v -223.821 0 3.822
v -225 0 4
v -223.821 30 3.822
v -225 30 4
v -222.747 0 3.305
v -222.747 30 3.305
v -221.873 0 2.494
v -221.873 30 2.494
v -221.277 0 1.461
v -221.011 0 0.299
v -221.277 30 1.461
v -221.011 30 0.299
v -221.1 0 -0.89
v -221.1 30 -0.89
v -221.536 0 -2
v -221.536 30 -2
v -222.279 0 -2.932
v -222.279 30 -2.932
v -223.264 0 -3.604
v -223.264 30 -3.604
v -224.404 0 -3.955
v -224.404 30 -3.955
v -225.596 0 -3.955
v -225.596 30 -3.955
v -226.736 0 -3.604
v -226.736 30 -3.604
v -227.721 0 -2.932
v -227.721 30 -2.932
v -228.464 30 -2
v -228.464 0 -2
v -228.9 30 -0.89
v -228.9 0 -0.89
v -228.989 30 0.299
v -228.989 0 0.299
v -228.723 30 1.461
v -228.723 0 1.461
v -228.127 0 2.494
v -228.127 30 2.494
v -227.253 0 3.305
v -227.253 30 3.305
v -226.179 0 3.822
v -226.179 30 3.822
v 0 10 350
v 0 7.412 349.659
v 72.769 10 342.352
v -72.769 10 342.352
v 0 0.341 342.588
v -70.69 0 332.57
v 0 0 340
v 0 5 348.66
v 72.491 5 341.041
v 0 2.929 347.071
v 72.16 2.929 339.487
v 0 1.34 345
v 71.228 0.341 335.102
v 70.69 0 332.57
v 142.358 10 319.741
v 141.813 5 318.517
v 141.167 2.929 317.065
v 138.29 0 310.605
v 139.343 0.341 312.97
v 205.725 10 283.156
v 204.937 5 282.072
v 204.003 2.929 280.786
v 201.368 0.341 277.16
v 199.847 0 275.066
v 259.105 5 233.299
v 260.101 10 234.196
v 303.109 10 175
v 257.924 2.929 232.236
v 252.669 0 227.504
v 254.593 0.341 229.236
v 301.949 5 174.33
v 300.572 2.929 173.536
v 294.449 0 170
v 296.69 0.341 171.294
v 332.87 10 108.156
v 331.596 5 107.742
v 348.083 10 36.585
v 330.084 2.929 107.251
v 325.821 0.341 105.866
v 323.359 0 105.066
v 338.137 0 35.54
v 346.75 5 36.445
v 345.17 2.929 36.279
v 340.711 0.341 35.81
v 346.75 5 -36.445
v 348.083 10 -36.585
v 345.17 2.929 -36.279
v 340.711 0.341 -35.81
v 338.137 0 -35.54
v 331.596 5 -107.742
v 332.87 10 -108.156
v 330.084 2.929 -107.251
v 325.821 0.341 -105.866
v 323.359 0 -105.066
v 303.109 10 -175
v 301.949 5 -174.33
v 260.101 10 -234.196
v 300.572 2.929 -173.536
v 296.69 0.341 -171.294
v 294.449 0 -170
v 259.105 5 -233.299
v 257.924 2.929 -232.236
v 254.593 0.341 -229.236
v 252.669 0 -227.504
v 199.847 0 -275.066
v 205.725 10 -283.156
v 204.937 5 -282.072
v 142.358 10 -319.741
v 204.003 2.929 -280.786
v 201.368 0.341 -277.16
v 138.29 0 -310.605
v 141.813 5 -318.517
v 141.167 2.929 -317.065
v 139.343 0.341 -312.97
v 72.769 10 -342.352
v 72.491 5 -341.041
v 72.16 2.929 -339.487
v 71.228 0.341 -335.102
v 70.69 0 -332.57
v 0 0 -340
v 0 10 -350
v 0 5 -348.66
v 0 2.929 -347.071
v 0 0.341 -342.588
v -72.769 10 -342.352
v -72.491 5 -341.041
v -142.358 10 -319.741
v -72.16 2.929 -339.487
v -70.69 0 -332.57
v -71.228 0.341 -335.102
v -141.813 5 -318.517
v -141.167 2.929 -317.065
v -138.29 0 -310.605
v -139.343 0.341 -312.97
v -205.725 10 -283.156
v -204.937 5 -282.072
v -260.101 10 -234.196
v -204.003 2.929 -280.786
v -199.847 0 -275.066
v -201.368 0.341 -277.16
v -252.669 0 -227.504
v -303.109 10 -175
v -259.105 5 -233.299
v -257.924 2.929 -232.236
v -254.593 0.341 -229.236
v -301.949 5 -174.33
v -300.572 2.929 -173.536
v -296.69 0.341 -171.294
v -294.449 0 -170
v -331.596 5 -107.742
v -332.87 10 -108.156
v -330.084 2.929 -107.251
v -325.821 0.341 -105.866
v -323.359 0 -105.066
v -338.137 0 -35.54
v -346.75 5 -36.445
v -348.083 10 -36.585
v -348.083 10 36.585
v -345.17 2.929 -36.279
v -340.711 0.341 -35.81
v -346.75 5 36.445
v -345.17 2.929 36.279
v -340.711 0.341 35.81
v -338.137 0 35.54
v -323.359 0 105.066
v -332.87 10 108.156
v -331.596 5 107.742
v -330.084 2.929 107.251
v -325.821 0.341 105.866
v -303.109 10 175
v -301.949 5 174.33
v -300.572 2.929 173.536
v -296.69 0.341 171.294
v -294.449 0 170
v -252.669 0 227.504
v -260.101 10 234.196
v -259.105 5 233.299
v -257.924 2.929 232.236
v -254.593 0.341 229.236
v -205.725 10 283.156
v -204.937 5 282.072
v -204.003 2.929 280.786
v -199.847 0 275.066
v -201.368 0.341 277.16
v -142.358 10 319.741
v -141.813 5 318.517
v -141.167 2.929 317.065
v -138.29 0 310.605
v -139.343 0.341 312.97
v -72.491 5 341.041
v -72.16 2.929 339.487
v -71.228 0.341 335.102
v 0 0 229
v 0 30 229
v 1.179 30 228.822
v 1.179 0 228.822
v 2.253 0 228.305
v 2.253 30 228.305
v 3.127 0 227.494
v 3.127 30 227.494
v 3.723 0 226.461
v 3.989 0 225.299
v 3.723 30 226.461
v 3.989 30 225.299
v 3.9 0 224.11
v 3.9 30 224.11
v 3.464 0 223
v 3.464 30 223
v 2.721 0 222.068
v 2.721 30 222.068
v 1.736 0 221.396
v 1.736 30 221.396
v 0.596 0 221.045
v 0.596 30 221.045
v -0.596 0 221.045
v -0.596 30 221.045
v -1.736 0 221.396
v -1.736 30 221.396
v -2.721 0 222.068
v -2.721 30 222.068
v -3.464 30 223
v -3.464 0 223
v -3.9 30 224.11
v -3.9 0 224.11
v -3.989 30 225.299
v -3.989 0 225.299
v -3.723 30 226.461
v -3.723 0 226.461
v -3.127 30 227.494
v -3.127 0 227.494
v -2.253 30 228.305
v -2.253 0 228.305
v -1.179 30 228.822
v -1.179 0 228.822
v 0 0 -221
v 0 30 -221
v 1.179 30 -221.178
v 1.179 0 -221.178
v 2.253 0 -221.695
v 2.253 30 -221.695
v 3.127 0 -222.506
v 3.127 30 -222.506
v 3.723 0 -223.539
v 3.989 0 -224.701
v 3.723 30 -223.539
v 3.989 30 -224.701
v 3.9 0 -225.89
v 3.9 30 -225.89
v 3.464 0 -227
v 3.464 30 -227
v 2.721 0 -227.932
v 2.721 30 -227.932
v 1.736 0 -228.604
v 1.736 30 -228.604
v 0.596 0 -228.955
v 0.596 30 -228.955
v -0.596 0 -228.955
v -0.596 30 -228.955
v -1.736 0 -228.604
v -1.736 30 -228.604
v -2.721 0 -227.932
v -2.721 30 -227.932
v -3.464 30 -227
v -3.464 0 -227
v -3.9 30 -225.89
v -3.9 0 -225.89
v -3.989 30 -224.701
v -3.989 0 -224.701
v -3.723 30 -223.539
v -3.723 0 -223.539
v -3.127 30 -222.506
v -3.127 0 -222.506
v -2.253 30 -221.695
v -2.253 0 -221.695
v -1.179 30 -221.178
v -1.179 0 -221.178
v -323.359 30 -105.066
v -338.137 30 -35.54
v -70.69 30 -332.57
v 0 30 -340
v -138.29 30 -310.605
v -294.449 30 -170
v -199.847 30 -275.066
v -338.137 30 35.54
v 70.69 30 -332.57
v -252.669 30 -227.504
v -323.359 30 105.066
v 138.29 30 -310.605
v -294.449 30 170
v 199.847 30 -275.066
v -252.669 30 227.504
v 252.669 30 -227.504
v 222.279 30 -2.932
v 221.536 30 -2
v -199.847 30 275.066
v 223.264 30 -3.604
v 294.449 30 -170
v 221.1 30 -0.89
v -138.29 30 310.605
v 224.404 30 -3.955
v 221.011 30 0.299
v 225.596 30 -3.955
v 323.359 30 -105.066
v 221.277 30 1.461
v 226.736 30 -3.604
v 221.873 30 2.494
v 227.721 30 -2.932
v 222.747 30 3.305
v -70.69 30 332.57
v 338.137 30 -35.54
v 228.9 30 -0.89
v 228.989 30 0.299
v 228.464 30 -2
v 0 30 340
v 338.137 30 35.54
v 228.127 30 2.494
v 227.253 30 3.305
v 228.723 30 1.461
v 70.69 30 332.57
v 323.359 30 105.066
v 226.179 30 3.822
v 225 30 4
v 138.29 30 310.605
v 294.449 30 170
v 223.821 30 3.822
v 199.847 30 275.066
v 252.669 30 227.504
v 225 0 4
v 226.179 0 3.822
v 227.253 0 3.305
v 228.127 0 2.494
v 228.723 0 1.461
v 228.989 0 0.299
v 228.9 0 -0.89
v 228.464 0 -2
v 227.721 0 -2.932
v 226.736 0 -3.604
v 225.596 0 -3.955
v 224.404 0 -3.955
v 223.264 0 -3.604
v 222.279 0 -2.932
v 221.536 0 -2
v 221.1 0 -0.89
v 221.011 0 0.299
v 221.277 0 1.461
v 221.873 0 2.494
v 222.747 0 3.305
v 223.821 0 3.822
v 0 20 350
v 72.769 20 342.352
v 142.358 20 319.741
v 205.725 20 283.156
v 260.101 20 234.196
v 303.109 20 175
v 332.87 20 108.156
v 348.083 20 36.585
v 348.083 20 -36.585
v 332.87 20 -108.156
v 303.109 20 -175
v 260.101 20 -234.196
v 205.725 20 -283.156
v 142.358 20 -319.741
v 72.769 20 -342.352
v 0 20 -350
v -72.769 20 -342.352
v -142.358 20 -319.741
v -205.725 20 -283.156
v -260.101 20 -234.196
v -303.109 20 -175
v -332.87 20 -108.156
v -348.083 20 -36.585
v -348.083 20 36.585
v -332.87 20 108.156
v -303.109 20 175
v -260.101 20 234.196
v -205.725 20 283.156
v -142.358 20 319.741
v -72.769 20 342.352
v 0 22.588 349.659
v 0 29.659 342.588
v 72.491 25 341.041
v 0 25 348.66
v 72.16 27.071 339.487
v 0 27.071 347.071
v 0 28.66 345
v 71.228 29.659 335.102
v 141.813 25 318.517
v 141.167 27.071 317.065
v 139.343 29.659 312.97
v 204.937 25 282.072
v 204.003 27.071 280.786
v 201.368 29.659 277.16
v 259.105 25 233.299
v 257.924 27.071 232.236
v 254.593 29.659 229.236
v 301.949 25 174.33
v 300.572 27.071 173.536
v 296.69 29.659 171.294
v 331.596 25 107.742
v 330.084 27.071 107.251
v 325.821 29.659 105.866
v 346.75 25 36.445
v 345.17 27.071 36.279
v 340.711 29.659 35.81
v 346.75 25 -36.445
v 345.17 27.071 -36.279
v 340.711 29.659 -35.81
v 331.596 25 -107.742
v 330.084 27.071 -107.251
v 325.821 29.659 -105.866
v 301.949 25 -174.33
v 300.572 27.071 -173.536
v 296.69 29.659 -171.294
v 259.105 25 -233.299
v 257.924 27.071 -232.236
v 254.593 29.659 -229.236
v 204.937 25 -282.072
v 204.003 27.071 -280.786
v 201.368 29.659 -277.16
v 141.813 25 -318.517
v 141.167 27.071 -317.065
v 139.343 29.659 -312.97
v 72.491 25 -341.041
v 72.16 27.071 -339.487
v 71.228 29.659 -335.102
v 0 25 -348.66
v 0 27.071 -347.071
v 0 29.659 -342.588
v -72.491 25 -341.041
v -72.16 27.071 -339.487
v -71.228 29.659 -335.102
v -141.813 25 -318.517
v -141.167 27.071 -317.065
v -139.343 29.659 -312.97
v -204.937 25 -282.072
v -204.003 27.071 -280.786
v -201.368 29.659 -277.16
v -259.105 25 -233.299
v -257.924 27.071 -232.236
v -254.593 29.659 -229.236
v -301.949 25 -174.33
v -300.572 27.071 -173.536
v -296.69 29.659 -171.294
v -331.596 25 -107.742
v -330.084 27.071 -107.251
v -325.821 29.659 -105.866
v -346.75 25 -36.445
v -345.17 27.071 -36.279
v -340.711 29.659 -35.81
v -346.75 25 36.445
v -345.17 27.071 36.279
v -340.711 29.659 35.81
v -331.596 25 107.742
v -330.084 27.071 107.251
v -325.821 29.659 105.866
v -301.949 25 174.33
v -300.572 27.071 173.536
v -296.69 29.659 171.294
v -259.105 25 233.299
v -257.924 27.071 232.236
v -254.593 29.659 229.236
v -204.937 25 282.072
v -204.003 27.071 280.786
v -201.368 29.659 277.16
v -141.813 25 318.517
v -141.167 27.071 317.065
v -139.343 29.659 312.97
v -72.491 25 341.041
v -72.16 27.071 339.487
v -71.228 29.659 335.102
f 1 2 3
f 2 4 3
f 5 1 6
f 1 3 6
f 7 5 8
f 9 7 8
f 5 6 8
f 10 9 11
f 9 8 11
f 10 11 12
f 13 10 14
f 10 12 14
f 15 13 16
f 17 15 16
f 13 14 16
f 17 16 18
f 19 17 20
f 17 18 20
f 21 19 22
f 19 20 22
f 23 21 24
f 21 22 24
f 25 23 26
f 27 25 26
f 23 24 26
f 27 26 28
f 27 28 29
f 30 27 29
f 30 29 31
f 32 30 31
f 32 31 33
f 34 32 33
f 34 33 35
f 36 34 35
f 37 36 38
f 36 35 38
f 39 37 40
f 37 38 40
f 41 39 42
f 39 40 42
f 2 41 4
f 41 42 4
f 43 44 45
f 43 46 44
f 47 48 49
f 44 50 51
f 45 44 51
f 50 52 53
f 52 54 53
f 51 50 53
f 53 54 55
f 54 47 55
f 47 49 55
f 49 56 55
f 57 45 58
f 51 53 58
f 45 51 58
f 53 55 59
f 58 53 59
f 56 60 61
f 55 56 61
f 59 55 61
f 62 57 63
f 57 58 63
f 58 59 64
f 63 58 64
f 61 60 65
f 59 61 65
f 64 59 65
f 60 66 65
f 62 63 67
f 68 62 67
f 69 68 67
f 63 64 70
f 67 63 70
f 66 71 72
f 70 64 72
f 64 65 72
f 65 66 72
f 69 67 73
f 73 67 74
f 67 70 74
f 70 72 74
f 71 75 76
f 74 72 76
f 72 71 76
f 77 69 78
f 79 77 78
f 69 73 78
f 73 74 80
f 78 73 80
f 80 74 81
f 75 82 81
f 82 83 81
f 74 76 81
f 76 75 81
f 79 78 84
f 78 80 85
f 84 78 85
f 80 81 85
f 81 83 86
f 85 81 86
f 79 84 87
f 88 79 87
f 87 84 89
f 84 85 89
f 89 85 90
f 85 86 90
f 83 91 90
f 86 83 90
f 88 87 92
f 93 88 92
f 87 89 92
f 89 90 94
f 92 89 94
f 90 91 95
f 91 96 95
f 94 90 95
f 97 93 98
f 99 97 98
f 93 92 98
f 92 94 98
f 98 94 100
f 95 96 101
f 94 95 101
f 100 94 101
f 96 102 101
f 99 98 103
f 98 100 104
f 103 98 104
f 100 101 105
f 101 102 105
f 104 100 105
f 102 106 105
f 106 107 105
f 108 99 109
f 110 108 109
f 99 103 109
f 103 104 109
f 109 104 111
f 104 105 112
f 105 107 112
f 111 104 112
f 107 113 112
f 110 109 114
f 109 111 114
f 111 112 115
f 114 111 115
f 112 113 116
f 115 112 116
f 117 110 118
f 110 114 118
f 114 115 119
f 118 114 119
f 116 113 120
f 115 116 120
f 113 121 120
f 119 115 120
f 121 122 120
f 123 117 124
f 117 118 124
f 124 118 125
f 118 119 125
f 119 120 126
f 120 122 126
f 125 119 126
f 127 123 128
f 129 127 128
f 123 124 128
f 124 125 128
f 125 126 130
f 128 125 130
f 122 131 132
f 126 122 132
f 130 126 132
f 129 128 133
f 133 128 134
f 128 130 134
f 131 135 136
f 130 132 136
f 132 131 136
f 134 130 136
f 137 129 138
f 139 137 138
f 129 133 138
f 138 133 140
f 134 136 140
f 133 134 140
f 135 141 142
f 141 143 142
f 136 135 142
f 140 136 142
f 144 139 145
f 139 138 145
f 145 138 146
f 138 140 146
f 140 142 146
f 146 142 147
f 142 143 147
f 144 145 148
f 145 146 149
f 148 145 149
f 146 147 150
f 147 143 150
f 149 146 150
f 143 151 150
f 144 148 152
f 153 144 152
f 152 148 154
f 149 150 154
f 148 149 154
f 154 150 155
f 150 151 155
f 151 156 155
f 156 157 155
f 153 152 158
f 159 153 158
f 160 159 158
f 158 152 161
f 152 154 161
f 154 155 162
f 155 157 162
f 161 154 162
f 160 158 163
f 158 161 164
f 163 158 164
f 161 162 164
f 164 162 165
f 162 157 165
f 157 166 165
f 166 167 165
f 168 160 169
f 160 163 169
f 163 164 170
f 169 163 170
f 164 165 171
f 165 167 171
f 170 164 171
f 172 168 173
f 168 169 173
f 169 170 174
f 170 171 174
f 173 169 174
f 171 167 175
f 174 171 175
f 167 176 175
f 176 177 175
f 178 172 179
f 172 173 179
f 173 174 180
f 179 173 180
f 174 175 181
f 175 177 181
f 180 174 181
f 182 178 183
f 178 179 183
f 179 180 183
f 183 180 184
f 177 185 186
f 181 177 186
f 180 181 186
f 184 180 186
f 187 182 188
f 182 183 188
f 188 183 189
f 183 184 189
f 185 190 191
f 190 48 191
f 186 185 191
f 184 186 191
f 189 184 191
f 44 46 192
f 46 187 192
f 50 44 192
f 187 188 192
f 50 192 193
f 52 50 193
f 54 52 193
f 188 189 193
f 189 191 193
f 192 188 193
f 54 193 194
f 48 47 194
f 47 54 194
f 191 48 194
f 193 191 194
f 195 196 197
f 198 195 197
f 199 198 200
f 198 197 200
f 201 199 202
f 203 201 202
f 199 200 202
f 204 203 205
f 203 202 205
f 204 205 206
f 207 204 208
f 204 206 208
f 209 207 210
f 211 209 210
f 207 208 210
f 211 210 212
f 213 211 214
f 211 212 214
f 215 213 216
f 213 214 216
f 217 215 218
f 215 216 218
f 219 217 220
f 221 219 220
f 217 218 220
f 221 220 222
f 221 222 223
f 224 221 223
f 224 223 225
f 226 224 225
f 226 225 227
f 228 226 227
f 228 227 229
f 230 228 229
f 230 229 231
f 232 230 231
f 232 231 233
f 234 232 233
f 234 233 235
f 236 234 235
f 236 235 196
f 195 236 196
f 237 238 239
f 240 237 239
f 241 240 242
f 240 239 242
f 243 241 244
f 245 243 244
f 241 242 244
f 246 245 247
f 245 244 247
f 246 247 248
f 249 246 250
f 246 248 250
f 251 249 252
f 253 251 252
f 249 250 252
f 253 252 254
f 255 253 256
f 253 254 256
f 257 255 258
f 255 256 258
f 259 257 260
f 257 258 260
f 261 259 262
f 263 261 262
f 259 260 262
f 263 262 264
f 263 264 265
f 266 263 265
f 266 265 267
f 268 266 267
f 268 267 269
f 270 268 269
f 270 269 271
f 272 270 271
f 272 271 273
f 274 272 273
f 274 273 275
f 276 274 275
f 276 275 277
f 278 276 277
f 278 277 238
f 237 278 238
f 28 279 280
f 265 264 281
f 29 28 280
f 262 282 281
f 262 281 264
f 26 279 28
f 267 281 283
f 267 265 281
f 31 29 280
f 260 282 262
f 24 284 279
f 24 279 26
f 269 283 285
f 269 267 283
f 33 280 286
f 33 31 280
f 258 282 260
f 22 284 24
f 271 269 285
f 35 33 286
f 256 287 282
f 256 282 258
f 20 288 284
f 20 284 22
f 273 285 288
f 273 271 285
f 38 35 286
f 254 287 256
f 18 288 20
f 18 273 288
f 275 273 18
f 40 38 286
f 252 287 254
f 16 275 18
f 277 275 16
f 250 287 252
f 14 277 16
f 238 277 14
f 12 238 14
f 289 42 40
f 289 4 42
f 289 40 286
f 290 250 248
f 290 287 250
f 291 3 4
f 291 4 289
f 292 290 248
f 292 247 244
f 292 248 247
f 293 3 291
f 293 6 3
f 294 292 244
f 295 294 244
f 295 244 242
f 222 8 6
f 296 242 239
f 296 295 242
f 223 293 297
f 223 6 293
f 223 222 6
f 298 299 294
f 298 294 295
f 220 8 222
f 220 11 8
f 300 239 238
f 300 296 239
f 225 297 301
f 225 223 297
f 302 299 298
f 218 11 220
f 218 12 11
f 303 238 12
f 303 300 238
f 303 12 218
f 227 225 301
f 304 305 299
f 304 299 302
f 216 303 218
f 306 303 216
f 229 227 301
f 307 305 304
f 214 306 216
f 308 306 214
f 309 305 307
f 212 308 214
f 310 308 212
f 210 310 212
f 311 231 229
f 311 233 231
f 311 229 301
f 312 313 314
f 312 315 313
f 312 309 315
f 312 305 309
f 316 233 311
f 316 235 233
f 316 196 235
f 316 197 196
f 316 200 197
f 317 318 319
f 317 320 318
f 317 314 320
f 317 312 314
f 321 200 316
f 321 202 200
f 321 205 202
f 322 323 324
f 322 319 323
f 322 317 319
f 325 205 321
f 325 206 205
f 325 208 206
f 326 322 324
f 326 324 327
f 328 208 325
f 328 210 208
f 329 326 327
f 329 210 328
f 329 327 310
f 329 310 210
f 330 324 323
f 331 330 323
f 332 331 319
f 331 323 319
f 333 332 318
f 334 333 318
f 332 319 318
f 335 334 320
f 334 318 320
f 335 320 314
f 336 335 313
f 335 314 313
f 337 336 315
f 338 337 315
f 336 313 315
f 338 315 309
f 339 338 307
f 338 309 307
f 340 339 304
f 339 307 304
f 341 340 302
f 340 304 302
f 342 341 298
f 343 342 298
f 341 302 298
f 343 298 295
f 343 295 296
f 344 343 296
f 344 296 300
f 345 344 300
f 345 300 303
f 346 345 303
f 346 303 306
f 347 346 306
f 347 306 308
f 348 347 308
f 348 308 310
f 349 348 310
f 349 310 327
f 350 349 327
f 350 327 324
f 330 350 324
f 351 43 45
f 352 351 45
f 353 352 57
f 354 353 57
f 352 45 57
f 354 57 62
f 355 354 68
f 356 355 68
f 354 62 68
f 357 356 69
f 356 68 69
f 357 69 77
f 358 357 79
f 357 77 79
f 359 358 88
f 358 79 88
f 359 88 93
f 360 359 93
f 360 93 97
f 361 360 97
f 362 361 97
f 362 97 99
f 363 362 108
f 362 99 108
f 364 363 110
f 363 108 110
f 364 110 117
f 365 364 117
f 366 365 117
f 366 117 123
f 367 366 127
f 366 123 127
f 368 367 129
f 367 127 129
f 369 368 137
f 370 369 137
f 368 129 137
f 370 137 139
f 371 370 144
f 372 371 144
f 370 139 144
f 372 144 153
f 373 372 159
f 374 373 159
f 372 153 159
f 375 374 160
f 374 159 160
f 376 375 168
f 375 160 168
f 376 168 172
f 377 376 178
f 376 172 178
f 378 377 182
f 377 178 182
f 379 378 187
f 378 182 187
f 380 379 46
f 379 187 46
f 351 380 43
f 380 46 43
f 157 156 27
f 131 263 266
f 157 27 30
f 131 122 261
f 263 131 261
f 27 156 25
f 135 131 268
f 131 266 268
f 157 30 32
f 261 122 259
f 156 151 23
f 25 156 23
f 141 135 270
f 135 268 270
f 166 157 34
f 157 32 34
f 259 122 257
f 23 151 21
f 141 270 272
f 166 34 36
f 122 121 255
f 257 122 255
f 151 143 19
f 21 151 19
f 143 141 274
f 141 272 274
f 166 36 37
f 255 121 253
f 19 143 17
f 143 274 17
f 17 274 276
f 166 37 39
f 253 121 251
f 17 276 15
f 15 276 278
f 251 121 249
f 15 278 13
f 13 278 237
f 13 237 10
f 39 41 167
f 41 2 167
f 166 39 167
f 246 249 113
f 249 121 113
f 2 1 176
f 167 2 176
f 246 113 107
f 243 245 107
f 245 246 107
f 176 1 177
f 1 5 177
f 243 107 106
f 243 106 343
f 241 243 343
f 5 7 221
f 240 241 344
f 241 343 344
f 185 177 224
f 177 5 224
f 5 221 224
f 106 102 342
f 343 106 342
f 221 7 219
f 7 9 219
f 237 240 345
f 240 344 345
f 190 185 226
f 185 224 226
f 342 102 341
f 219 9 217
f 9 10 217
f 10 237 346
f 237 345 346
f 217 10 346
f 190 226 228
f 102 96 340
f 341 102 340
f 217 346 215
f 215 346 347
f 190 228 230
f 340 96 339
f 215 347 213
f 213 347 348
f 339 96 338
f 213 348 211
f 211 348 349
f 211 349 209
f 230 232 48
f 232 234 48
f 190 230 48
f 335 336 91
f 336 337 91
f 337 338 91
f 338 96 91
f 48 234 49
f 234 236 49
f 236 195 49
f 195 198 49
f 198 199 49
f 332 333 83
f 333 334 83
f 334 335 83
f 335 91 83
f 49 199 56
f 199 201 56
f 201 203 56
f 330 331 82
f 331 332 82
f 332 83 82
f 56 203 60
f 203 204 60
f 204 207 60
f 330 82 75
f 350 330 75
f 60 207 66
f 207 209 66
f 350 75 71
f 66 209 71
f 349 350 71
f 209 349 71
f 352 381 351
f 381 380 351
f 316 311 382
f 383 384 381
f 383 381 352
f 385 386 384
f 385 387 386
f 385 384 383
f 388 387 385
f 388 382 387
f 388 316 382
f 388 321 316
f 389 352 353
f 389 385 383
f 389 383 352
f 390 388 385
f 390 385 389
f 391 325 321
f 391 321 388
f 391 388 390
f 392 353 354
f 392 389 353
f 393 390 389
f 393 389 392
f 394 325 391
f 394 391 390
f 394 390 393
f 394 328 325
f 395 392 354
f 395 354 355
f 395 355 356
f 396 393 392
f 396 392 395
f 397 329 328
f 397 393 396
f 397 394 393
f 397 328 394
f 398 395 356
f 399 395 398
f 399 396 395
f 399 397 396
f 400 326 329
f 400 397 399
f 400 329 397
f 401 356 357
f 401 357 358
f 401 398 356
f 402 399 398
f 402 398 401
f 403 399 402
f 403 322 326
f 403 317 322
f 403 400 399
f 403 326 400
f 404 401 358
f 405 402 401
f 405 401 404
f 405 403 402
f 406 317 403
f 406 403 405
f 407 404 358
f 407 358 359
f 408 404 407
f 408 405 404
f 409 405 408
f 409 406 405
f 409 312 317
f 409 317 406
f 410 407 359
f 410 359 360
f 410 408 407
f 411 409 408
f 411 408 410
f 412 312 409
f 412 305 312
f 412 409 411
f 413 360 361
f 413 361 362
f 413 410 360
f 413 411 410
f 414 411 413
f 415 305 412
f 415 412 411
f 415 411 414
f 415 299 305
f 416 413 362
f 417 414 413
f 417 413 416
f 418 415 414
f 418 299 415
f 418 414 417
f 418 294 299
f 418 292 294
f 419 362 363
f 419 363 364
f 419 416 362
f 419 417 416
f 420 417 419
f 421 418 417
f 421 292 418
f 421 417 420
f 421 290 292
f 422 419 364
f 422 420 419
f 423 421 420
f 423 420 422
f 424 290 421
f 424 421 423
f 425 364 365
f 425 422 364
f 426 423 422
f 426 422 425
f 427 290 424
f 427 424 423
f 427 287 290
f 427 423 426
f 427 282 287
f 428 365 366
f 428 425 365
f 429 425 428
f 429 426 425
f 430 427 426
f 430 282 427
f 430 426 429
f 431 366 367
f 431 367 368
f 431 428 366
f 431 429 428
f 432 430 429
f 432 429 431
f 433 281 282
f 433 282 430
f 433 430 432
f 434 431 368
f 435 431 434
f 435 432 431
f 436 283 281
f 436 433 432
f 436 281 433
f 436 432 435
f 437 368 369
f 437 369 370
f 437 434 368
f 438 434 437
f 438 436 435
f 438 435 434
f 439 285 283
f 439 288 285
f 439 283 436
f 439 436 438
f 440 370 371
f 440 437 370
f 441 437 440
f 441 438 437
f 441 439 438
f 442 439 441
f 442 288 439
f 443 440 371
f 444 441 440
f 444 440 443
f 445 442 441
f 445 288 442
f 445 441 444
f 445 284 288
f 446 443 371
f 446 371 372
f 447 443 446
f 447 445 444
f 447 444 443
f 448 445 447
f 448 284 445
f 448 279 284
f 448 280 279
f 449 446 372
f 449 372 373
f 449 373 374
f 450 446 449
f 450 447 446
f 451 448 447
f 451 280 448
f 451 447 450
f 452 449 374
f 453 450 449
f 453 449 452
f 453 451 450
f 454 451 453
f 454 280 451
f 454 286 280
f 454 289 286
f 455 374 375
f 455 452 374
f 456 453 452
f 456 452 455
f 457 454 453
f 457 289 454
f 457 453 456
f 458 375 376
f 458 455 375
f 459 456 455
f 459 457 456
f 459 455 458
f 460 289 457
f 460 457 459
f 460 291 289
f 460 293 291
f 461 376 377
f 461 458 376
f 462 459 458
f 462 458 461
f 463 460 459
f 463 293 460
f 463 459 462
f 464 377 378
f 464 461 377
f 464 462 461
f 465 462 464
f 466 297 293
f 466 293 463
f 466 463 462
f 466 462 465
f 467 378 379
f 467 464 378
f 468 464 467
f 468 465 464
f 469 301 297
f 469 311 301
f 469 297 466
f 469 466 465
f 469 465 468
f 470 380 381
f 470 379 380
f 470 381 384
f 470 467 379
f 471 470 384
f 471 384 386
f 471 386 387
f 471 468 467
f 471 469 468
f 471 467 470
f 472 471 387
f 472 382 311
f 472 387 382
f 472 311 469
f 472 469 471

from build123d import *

# Parameters (mm, degrees)
SKETCH1_R           = 350
BOSS_EXTRUDE1_DEPTH = 30
FILLET1_R           = 10
SKETCH2_R           = 4
CUT_EXTRUDE1_DEPTH  = 48


with BuildPart() as part:
    # Sketch1 → Boss-Extrude1 (new body)
    with BuildSketch(Plane(origin=(0, 0, 0), x_dir=(1, 0, 0), z_dir=(0, 1, 0))):
        with Locations(Location((0, 0, 0), (0, 0, 270))):
            Circle(SKETCH1_R)
    extrude(amount=BOSS_EXTRUDE1_DEPTH)

    # Fillet1
    fillet1_edges = [part.edges().sort_by_distance(p)[0] for p in [
        (0, 0, -350),
        (0, 30, -350),
    ]]
    fillet(fillet1_edges, radius=FILLET1_R)

    # Sketch2 → Cut-Extrude1 (cut, symmetric)
    with BuildSketch(Plane(origin=(0, 30, 0), x_dir=(1, 0, 0), z_dir=(0, 1, 0))):
        with Locations(Location((0, 225, 0), (0, 0, 270))):
            Circle(SKETCH2_R)
        with Locations(Location((225, 0, 0), (0, 0, 270))):
            Circle(SKETCH2_R)
        with Locations(Location((0, -225, 0), (0, 0, 270))):
            Circle(SKETCH2_R)
        with Locations(Location((-225, 0, 0), (0, 0, 270))):
            Circle(SKETCH2_R)
    extrude(amount=CUT_EXTRUDE1_DEPTH, both=True, mode=Mode.SUBTRACT)


solid = part.part
